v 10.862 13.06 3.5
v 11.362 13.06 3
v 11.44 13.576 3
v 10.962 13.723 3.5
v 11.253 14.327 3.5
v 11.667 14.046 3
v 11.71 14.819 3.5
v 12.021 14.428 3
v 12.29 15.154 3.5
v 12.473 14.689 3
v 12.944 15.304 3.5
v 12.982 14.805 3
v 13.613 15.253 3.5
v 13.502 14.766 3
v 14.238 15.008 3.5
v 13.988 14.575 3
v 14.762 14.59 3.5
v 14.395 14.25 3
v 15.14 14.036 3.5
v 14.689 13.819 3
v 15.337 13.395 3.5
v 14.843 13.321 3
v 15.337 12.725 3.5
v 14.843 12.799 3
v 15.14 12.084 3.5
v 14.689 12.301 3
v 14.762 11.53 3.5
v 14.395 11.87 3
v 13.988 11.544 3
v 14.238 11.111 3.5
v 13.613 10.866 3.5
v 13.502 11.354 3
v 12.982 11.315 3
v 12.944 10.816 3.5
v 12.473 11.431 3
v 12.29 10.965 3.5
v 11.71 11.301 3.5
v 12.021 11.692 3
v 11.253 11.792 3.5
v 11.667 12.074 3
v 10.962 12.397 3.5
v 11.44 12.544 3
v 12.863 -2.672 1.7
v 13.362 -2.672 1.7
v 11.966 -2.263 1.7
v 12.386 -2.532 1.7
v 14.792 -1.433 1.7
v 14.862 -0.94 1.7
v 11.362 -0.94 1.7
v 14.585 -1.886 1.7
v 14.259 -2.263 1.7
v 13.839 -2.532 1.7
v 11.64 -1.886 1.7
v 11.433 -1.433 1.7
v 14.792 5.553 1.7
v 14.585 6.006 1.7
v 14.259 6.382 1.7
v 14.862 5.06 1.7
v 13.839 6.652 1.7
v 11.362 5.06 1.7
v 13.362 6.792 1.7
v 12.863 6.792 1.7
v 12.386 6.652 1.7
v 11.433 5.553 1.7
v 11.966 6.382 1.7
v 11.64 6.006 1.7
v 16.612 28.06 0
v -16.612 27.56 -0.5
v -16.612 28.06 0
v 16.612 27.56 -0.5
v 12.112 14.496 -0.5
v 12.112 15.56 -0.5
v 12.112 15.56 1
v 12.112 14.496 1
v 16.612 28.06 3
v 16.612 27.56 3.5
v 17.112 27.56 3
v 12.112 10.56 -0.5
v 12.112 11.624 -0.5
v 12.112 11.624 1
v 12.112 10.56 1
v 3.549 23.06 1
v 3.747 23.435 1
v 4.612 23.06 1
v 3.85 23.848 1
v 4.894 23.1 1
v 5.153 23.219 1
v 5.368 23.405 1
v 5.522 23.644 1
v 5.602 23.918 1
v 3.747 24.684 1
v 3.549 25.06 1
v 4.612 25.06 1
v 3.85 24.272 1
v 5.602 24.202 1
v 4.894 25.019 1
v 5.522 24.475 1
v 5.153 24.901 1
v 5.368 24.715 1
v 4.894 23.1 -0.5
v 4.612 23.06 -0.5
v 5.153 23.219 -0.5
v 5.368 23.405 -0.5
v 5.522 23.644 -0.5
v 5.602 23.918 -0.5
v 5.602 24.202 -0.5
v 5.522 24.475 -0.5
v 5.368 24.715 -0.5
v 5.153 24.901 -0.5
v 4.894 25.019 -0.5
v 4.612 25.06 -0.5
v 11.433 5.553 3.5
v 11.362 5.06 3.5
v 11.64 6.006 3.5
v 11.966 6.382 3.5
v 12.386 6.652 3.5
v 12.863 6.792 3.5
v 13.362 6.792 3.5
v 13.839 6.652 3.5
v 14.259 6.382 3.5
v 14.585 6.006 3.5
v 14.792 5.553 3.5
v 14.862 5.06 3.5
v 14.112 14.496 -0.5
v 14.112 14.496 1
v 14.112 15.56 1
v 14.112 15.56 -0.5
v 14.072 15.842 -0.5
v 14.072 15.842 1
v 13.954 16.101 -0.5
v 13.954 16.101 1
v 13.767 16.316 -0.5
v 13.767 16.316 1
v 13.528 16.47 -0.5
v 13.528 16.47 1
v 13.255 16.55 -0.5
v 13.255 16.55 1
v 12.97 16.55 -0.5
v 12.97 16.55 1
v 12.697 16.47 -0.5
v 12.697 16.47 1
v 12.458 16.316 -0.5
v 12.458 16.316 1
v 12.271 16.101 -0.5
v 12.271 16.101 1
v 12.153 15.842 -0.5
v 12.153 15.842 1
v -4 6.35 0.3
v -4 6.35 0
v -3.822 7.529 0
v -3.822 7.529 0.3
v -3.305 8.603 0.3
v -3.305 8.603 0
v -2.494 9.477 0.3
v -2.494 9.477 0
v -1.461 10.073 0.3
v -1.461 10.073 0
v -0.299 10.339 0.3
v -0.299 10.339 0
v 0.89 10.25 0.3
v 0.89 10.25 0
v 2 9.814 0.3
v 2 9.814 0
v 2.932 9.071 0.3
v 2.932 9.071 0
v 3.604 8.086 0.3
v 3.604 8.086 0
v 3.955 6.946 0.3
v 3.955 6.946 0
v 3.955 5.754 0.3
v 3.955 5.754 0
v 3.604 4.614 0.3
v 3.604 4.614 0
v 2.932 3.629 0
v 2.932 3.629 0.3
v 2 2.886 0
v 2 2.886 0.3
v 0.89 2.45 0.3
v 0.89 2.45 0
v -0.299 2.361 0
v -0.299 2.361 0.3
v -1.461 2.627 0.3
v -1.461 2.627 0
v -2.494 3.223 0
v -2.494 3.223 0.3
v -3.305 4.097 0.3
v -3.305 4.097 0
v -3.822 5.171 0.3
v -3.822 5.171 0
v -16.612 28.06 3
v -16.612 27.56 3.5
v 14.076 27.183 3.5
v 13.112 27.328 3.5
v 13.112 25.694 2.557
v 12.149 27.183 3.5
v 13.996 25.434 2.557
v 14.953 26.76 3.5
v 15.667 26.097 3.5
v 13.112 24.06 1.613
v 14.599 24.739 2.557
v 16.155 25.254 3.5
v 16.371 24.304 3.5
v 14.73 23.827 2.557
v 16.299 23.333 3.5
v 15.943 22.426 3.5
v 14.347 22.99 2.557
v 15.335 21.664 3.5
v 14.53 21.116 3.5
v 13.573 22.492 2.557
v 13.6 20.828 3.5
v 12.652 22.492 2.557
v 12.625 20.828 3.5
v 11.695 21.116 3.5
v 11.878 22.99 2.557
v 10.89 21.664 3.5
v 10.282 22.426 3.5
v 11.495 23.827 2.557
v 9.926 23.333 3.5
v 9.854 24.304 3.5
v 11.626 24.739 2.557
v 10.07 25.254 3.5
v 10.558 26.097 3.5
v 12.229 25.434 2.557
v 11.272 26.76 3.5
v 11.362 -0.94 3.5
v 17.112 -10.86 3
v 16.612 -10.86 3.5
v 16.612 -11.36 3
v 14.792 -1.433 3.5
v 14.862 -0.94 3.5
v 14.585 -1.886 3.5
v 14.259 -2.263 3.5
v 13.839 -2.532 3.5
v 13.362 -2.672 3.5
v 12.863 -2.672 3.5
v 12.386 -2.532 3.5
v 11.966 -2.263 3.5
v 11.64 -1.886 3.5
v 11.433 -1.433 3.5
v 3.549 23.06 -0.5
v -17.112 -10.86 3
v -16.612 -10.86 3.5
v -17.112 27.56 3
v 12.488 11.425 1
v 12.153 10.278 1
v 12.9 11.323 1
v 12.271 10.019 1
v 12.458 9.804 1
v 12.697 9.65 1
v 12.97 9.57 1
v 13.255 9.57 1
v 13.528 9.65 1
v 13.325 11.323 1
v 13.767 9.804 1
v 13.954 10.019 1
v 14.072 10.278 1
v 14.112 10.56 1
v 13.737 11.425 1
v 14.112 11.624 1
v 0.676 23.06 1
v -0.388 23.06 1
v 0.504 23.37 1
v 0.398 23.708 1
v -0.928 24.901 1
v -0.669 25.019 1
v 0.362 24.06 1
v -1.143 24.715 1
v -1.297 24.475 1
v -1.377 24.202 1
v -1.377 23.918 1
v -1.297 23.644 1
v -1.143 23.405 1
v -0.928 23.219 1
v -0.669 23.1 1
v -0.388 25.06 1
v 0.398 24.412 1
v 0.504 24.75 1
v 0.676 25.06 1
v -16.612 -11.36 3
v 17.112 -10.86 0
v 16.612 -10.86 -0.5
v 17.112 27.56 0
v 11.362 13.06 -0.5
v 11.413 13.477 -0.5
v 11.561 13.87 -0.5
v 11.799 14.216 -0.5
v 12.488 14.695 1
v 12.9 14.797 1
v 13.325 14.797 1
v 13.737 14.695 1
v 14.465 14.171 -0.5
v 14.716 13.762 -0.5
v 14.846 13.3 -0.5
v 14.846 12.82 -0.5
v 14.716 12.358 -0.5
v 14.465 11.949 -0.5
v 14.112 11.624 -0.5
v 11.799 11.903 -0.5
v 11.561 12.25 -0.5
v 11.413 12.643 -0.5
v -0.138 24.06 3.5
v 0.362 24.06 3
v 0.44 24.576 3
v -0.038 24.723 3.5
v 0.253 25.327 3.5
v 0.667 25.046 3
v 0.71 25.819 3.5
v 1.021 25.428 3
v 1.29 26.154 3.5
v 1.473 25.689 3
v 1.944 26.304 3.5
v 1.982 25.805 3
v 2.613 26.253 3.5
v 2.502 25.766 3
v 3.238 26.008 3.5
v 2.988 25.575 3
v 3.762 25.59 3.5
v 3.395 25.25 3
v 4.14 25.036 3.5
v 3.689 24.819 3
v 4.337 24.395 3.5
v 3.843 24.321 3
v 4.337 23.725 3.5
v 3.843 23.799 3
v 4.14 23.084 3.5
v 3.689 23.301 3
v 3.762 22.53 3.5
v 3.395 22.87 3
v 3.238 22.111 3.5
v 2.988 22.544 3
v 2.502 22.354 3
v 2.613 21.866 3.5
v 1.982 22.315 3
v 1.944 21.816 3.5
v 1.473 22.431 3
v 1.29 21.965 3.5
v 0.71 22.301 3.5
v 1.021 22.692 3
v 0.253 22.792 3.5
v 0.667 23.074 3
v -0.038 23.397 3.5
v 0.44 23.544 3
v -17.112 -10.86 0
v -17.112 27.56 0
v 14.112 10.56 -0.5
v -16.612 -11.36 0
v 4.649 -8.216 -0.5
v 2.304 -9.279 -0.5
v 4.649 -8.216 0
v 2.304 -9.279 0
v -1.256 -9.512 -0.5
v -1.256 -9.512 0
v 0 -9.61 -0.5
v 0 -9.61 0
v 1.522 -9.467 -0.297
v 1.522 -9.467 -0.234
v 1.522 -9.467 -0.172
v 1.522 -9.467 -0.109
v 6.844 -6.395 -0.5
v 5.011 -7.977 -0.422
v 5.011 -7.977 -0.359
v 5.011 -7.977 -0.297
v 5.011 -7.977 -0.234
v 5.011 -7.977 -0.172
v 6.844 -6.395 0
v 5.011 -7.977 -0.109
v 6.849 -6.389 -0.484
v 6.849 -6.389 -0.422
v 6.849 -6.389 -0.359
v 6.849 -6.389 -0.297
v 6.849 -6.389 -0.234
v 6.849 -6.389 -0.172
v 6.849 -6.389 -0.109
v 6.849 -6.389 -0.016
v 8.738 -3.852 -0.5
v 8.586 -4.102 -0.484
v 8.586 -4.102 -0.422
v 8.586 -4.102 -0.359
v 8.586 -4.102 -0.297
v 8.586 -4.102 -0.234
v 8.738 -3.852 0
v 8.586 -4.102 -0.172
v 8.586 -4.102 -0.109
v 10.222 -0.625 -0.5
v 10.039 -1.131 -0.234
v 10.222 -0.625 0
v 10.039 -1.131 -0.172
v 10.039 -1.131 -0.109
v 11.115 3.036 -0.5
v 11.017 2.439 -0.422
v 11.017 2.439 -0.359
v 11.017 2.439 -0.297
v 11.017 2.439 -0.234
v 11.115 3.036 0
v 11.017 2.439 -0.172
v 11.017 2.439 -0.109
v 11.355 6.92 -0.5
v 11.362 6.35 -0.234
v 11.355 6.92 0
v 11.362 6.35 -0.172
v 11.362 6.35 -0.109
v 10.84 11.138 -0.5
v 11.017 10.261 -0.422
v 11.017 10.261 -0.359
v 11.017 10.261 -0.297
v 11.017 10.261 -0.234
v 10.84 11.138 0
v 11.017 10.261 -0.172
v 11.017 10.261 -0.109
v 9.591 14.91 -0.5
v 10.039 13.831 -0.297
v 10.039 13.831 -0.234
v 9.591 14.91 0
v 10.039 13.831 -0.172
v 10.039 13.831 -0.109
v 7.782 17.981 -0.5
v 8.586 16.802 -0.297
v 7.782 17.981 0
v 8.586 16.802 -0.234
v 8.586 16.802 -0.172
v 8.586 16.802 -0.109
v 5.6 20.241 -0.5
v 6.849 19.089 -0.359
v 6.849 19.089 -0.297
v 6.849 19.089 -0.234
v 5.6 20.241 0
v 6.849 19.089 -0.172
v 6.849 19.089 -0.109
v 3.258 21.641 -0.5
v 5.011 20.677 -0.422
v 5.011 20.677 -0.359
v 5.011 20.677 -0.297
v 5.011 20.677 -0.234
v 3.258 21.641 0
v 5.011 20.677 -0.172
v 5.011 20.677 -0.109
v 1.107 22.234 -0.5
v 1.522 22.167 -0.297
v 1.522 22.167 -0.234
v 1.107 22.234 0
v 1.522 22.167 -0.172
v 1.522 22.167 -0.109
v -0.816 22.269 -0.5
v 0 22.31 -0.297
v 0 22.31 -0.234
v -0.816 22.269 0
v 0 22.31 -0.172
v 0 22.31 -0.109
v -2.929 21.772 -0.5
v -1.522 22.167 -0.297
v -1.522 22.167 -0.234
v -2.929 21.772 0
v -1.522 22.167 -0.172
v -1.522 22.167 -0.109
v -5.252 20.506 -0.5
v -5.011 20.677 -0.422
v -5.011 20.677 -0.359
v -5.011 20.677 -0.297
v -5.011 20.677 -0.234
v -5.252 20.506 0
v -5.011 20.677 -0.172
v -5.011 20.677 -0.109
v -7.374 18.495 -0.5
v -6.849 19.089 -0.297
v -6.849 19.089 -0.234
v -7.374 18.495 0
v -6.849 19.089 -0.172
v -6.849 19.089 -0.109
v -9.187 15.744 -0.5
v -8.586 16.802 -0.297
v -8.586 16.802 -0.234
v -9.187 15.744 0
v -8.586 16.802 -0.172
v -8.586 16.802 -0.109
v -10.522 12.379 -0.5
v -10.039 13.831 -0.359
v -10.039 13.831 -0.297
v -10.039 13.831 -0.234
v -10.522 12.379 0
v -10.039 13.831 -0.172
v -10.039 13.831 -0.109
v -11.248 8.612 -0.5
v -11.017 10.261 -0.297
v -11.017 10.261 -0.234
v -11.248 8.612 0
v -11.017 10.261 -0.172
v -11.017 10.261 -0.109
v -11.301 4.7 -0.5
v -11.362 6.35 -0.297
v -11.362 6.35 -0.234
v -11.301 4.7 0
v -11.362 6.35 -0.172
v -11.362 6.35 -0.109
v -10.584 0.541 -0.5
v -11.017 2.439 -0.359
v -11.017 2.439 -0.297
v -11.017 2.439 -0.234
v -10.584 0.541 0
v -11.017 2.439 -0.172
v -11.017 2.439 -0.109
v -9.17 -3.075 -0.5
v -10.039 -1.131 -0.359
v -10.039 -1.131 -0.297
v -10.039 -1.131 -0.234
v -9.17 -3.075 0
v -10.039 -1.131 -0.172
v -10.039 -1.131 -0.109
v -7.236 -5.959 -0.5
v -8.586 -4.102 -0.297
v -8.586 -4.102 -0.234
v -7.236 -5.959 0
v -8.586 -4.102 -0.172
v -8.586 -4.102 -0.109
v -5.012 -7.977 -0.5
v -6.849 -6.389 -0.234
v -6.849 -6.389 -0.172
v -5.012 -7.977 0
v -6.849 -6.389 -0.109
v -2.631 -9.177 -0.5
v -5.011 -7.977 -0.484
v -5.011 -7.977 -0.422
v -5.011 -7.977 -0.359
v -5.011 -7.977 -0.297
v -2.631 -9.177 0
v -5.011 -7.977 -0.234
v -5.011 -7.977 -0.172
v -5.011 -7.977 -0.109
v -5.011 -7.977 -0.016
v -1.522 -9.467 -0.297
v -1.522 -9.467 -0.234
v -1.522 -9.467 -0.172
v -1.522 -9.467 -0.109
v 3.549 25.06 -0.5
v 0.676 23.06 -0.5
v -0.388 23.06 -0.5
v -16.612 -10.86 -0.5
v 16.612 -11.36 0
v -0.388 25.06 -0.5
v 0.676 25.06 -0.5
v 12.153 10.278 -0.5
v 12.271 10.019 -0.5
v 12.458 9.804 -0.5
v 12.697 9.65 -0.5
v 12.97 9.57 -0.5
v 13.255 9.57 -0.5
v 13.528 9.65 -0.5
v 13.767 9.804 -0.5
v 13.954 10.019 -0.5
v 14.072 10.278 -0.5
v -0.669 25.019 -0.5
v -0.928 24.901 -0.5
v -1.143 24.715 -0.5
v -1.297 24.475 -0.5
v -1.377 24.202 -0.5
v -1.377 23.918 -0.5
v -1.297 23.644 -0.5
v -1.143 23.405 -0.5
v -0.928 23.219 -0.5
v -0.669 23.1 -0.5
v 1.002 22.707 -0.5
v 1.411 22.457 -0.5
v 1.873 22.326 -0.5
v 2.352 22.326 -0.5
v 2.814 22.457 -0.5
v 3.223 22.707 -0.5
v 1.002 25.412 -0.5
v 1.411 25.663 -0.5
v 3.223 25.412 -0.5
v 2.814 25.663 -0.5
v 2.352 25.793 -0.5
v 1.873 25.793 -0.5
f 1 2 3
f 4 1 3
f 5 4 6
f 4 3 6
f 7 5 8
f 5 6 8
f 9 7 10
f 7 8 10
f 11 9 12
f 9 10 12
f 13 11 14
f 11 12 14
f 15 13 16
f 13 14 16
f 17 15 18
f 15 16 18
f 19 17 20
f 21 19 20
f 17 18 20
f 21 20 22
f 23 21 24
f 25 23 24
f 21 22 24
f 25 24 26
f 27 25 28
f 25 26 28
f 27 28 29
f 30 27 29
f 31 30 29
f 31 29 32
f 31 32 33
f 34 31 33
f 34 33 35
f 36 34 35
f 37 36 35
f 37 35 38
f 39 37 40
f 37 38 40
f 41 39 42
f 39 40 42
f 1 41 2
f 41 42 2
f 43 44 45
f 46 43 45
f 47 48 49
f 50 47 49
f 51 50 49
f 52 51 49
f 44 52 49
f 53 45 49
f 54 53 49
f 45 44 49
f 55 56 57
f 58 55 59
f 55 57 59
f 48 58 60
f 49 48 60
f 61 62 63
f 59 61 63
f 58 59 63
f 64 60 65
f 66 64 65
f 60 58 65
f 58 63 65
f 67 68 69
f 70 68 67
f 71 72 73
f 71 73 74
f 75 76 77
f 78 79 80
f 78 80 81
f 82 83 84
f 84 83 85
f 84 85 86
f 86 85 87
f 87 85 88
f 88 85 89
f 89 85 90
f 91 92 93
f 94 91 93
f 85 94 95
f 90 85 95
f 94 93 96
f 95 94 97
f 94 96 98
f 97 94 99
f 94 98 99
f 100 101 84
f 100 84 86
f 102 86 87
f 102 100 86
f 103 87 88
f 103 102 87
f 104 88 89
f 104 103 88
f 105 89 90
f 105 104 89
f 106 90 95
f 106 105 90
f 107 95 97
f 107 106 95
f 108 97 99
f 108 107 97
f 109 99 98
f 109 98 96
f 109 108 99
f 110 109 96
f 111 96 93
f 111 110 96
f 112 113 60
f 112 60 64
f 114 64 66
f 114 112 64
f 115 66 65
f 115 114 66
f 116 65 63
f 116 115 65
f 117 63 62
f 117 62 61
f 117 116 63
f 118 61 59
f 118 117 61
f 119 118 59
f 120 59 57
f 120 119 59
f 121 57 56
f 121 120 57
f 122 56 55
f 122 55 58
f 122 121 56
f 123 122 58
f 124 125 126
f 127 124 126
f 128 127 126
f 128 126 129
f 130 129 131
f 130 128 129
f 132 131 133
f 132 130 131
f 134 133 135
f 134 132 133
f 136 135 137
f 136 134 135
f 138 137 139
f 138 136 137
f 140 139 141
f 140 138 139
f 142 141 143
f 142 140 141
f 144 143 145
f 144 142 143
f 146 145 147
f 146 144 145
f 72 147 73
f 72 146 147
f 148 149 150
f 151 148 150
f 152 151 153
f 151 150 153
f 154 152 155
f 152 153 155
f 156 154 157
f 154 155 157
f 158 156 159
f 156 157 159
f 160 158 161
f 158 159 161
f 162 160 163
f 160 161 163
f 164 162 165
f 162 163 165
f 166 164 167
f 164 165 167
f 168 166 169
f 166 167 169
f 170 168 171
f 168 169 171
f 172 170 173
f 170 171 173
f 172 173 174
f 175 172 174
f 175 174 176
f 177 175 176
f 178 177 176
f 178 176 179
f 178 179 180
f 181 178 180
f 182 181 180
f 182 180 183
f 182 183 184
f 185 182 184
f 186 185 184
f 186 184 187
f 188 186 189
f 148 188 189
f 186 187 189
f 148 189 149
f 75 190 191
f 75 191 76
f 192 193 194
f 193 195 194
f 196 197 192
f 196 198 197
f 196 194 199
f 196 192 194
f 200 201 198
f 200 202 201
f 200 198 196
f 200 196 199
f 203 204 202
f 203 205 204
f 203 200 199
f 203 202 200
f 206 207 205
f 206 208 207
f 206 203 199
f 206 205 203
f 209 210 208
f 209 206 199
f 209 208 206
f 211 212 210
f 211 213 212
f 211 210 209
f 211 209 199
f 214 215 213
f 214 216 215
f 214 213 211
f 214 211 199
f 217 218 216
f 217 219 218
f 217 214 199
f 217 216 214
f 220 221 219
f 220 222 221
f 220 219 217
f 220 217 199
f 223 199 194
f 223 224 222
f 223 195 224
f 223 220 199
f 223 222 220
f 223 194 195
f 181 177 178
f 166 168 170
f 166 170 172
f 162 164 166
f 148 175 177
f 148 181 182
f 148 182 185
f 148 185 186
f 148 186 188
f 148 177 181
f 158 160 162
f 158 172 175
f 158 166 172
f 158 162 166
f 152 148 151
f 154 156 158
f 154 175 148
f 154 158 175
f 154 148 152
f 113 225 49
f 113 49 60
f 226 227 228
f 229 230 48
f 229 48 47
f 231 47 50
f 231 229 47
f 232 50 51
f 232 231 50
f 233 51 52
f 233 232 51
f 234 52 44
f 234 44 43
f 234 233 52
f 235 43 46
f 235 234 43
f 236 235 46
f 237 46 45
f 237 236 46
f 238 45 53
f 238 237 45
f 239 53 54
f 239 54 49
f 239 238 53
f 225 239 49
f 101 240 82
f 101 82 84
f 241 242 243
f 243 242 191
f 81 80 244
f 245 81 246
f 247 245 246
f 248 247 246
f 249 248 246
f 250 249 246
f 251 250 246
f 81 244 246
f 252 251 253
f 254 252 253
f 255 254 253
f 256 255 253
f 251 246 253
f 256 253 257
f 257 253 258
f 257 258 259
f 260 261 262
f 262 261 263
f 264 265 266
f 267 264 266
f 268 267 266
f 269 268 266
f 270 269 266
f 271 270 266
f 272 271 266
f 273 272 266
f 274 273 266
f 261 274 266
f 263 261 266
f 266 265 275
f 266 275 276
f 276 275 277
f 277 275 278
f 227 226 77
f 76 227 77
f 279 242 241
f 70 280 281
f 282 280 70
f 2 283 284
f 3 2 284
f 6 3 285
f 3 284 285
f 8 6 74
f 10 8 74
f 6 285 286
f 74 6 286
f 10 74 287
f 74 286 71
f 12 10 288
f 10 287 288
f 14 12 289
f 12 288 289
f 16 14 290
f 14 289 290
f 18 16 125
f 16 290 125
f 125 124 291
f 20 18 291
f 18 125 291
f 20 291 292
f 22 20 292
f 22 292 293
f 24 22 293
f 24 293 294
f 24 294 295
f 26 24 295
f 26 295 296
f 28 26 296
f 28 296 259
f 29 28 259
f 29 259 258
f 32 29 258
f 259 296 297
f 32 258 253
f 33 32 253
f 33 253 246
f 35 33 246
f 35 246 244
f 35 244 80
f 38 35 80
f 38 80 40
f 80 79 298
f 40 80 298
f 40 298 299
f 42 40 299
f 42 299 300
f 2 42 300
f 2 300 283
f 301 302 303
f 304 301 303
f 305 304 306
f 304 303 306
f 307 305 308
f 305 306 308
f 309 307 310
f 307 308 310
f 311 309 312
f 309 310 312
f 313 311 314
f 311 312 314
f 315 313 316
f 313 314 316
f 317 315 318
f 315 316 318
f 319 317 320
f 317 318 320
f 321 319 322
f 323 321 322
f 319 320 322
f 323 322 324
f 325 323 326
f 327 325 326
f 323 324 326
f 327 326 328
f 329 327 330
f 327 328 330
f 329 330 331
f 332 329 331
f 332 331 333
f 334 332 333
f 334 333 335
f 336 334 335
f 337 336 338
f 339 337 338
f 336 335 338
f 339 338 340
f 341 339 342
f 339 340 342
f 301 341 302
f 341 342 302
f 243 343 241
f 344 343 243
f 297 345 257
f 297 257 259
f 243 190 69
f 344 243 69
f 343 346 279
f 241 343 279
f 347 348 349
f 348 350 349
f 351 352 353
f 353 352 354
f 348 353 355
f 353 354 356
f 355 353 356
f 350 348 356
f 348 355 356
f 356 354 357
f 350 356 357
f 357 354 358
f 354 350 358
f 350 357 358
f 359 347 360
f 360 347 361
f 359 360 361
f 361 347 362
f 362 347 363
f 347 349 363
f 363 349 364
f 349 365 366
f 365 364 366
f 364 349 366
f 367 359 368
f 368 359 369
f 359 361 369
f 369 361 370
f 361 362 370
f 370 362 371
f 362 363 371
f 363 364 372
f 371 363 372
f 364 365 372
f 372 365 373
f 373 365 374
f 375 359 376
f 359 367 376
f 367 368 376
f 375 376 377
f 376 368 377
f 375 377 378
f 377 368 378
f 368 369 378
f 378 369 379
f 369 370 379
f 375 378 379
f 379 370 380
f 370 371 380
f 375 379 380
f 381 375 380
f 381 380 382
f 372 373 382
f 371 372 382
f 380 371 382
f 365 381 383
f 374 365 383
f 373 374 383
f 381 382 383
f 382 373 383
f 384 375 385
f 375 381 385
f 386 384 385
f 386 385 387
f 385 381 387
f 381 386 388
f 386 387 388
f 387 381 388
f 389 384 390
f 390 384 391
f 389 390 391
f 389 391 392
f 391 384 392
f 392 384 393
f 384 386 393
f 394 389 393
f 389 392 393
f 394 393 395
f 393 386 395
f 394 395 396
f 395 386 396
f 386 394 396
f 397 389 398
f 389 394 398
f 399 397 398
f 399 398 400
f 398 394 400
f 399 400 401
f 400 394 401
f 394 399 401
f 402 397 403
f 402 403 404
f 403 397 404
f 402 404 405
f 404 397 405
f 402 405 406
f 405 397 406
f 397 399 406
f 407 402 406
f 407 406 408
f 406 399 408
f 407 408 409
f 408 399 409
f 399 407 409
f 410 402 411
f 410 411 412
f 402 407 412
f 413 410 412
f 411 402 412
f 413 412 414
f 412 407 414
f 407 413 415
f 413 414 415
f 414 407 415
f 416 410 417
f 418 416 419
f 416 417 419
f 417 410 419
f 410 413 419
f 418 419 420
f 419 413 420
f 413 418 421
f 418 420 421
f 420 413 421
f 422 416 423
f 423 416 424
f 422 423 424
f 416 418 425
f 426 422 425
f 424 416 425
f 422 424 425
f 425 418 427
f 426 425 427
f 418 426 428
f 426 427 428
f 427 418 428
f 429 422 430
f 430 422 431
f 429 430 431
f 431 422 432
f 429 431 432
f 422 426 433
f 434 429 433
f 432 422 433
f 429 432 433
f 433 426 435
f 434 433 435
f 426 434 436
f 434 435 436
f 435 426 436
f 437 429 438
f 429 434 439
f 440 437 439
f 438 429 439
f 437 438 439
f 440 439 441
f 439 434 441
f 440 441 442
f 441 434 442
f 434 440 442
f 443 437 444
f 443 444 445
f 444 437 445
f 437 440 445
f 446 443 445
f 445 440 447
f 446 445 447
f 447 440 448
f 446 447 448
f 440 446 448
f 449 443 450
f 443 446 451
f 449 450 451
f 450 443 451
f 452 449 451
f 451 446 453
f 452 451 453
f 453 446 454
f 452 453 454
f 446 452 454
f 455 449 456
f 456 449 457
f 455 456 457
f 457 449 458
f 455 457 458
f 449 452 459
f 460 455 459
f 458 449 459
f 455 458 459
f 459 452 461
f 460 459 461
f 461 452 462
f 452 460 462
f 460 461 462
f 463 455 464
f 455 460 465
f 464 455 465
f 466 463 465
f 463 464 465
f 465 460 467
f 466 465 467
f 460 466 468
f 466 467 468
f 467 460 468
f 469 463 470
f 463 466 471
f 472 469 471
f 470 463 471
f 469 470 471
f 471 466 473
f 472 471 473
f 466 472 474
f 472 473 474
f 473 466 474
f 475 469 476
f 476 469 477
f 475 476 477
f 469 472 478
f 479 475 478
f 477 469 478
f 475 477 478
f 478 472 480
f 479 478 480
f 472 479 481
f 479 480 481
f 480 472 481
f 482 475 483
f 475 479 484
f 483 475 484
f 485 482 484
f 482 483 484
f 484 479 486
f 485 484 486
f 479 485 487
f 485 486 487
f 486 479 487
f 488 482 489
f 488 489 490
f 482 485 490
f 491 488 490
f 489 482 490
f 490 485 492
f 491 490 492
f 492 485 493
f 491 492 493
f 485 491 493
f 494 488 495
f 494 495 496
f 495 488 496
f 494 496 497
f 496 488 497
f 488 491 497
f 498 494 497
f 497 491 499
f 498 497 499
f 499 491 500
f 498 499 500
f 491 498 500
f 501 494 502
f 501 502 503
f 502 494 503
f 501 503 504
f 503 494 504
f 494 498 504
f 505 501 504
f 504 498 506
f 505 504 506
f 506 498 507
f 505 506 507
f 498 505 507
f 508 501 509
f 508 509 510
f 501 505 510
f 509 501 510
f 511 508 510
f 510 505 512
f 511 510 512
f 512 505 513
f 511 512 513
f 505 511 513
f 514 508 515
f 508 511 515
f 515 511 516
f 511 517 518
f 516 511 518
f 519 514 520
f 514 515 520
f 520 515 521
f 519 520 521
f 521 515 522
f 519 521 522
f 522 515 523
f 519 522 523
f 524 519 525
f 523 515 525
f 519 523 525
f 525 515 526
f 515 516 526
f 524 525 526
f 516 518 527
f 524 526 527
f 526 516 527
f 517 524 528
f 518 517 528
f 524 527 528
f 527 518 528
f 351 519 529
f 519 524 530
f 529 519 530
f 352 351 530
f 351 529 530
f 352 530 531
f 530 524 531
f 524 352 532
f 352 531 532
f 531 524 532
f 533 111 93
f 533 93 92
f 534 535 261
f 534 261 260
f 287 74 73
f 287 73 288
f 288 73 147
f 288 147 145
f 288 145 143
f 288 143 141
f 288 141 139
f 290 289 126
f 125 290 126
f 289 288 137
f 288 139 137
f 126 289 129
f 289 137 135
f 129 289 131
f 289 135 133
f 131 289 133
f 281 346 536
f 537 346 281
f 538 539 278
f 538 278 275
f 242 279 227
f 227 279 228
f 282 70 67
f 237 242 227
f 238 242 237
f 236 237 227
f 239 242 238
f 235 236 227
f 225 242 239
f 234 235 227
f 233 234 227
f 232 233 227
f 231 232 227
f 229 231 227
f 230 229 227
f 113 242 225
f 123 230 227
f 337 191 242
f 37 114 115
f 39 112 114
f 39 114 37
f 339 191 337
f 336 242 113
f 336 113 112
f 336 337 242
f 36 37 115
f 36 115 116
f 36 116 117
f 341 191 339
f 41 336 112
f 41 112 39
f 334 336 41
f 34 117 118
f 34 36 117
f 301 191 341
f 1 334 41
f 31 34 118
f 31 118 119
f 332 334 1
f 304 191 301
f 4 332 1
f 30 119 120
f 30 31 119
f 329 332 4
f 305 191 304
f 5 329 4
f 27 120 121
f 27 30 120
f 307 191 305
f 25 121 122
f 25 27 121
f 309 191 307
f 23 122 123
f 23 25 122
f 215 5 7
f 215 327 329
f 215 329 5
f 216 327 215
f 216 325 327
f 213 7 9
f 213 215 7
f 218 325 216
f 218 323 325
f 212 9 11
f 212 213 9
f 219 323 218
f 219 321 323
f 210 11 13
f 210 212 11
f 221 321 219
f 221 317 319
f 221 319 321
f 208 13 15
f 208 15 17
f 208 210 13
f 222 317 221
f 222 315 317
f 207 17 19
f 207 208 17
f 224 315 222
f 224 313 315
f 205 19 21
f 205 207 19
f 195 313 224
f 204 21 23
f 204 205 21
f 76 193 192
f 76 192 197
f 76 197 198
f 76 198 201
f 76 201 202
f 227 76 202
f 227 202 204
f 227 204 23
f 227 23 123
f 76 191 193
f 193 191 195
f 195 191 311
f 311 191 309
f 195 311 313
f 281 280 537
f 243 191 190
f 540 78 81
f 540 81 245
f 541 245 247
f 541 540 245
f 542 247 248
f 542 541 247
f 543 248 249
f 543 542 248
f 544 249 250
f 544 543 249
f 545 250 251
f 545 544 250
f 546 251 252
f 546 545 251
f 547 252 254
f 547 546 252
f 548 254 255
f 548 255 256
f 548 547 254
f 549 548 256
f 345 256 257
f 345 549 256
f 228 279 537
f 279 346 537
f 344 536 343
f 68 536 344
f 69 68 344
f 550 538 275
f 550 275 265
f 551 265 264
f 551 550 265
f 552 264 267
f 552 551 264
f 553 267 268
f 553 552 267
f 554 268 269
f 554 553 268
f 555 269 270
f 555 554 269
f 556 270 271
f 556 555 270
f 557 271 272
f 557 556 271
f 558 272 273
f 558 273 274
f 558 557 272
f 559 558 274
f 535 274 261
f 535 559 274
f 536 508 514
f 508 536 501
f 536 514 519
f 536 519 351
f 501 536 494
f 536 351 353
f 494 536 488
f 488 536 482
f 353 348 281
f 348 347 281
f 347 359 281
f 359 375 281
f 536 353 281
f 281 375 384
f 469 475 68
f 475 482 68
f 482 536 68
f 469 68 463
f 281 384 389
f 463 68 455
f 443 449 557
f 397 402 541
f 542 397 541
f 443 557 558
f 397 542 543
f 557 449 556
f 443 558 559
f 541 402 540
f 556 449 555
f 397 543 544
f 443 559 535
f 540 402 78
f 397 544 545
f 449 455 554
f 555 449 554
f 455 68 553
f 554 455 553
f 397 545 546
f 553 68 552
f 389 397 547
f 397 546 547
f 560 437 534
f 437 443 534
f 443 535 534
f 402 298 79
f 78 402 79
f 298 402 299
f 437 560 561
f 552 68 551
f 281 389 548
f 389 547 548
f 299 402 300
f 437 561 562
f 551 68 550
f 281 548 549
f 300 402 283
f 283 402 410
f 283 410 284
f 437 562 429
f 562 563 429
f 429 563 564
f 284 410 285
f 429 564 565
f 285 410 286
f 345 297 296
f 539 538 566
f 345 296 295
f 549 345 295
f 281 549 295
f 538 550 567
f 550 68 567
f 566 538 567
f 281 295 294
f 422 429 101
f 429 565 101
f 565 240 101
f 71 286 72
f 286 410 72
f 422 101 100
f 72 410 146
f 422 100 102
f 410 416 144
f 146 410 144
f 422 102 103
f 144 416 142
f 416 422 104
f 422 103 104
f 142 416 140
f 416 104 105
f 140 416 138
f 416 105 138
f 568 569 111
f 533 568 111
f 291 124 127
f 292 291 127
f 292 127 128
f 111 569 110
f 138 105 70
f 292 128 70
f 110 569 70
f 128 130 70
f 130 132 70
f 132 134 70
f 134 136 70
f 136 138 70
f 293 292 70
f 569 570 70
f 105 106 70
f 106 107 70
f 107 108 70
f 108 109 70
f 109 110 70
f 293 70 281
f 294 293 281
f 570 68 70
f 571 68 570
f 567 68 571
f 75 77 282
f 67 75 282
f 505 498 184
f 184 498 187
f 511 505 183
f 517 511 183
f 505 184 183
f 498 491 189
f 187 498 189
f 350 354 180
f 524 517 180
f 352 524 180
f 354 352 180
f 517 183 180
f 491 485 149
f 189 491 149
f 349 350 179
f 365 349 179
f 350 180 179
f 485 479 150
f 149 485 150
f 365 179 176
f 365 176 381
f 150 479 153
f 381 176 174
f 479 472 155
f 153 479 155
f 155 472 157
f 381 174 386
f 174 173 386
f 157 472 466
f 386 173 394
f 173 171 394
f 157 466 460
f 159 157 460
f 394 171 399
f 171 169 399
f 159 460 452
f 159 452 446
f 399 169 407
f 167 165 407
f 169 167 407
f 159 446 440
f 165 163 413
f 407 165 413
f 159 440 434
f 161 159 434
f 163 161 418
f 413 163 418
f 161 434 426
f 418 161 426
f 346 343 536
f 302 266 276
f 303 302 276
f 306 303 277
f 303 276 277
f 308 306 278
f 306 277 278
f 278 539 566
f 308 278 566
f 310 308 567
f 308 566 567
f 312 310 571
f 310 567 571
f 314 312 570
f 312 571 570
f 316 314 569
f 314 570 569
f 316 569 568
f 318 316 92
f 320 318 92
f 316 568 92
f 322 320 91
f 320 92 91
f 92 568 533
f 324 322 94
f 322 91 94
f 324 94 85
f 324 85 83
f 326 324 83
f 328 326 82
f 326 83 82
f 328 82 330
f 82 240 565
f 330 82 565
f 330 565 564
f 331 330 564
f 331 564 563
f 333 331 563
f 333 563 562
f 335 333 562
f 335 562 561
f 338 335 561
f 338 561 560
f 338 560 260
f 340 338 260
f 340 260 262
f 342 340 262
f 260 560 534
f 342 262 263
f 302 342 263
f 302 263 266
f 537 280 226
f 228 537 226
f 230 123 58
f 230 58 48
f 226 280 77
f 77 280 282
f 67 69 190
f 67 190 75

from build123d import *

# Parameters (mm, degrees)
SKICA1_W                 = 34.225
SKICA1_H                 = 39.4198
P_IDAT_VYSUNUT_M1_DEPTH  = 0.5
SKICA2_W                 = 34.225
SKICA2_H                 = 39.4198
P_IDAT_VYSUNUT_M2_DEPTH  = 3.5
ODEBRAT_VYSUNUT_M1_DEPTH = 1.8
SKICA10_R                = 4
ODEBRAT_VYSUNUT_M2_DEPTH = 0.3
F_3_5_3_5_PR_M_R_D_RY2_D = 3.5
ODEBRAT_VYSUNUT_M3_DEPTH = 1.5
ZKOSEN_1_SIZE            = 0.5
ZKOSEN_2_SIZE            = 0.5


with BuildPart() as part:
    # Skica1 → Přidat vysunutím1 (new body)
    with BuildSketch(Plane.XY):
        with Locations((0, 8.35)):
            Rectangle(SKICA1_W, SKICA1_H)
        with BuildLine():
            add(Edge.make_bspline(
                [(0, 22.3099), (-0.246563065, 22.3099), (-0.728122288, 22.288848257), (-1.777632638, 22.145587032), (-3.184972708, 21.743129564), (-5.004743408, 20.777166583), (-7.484278794, 18.688737501), (-9.783532683, 15.143578871), (-11.124914139, 10.319965431), (-11.48129293, 6.35), (-11.124914139, 2.380034569), (-9.783532683, -2.443578871), (-7.484278794, -5.988737501), (-5.004743408, -8.077166583), (-3.184972708, -9.043129564), (-1.777632638, -9.445587032), (-0.728122288, -9.588848257), (-0.246563065, -9.6099), (0, -9.6099)],
                knots=[3.141592654, 3.141592654, 3.141592654, 3.141592654, 3.239767424, 3.337942194, 3.534291735, 3.730641276, 3.926990817, 4.319689899, 4.51603944, 4.71238898, 4.908738521, 5.105088062, 5.497787144, 5.694136685, 5.890486225, 6.086835766, 6.185010537, 6.283185307, 6.283185307, 6.283185307, 6.283185307], degree=3))
            add(Edge.make_bspline(
                [(0, -9.6099), (0.246563065, -9.6099), (0.728122288, -9.588848257), (1.777632638, -9.445587032), (3.184972708, -9.043129564), (5.004743408, -8.077166583), (7.484278794, -5.988737501), (9.783532683, -2.443578871), (11.124914139, 2.380034569), (11.48129293, 6.35), (11.124914139, 10.319965431), (9.783532683, 15.143578871), (7.484278794, 18.688737501), (5.004743408, 20.777166583), (3.184972708, 21.743129564), (1.777632638, 22.145587032), (0.728122288, 22.288848257), (0.246563065, 22.3099), (0, 22.3099)],
                knots=[0, 0, 0, 0, 0.09817477, 0.196349541, 0.392699082, 0.589048623, 0.785398163, 1.178097245, 1.374446786, 1.570796327, 1.767145868, 1.963495408, 2.35619449, 2.552544031, 2.748893572, 2.945243113, 3.043417883, 3.141592654, 3.141592654, 3.141592654, 3.141592654], degree=3))
        make_face(mode=Mode.SUBTRACT)
    extrude(amount=-P_IDAT_VYSUNUT_M1_DEPTH)

    # Skica2 → Přidat vysunutím2 (add)
    with BuildSketch(Plane.XY):
        with Locations((0, 8.35)):
            Rectangle(SKICA2_W, SKICA2_H)
    extrude(amount=P_IDAT_VYSUNUT_M2_DEPTH)

    # Skica6 → Odebrat vysunutím1 (cut)
    with BuildSketch(Plane.XY.offset(3.5)):
        with BuildLine():
            Line((11.3625, -0.9401), (11.3625, 5.0599))
            ThreePointArc((11.3625, 5.0599), (13.1125, 6.8099), (14.8625, 5.0599))
            Line((14.8625, 5.0599), (14.8625, -0.9401))
            ThreePointArc((14.8625, -0.9401), (13.1125, -2.6901), (11.3625, -0.9401))
        make_face()
    extrude(amount=-ODEBRAT_VYSUNUT_M1_DEPTH, mode=Mode.SUBTRACT)

    # Skica9 → Odebrat rotací1 (revolve, cut)
    with BuildSketch(Plane(origin=(13.1125, 0, 0), x_dir=(0, -1, 0), z_dir=(-1, 0, 0))):
        Polygon((-27.327849192, 3.5), (-24.0599, 3.5), (-24.0599, 1.613248654), align=None)
    revolve(axis=Axis((13.1125, 24.0599, 3.5), (0, 0, -1)), mode=Mode.SUBTRACT)

    # Skica10 → Odebrat vysunutím2 (cut)
    with BuildSketch(Plane(origin=(0, 0, 0), x_dir=(-1, 0, 0), z_dir=(0, 0, -1))):
        with Locations((0, 6.35)):
            Circle(SKICA10_R)
    extrude(amount=-ODEBRAT_VYSUNUT_M2_DEPTH, mode=Mode.SUBTRACT)

    # Ø3.5 (3.5) průměr díry2 (through all)
    with Locations(Plane(origin=(2.1125, 24.0599, 3.5), x_dir=(1, 0, 0), z_dir=(0, 0, 1))):
        with Locations((0, 0), (11, -11)):
            Hole(F_3_5_3_5_PR_M_R_D_RY2_D / 2)

    # Skica16 → Odebrat vysunutím3 (cut)
    with BuildSketch(Plane(origin=(0, 0, -0.5), x_dir=(-1, 0, 0), z_dir=(0, 0, -1))):
        with BuildLine():
            Line((0.3875, 23.0599), (-4.6125, 23.0599))
            ThreePointArc((-4.6125, 23.0599), (-5.6125, 24.0599), (-4.6125, 25.0599))
            Line((-4.6125, 25.0599), (0.3875, 25.0599))
            ThreePointArc((0.3875, 25.0599), (1.3875, 24.0599), (0.3875, 23.0599))
        make_face()
        with BuildLine():
            Line((-14.1125, 10.5599), (-14.1125, 15.5599))
            ThreePointArc((-14.1125, 15.5599), (-13.1125, 16.5599), (-12.1125, 15.5599))
            Line((-12.1125, 15.5599), (-12.1125, 10.5599))
            ThreePointArc((-12.1125, 10.5599), (-13.1125, 9.5599), (-14.1125, 10.5599))
        make_face()
    extrude(amount=-ODEBRAT_VYSUNUT_M3_DEPTH, mode=Mode.SUBTRACT)

    # Zkosení1
    zkosen_1_edges = [part.edges().sort_by_distance(p)[0] for p in [
        (17.1125, 8.35, -0.5),
        (0, 28.0599, -0.5),
        (-17.1125, 8.35, 3.5),
        (0, -11.3599, 3.5),
        (17.1125, 8.35, 3.5),
        (0, 28.0599, 3.5),
        (-17.1125, 8.35, -0.5),
        (-17.1125, 28.0599, 1.5),
        (17.1125, 28.0599, 1.5),
        (17.1125, -11.3599, 1.5),
        (-17.1125, -11.3599, 1.5),
        (0, -11.3599, -0.5),
    ]]
    chamfer(zkosen_1_edges, length=ZKOSEN_1_SIZE)

    # Zkosení2
    zkosen_2_edges = [part.edges().sort_by_distance(p)[0] for p in [
        (14.8625, 13.0599, 3.5),
        (3.8625, 24.0599, 3.5),
    ]]
    chamfer(zkosen_2_edges, length=ZKOSEN_2_SIZE)


solid = part.part
